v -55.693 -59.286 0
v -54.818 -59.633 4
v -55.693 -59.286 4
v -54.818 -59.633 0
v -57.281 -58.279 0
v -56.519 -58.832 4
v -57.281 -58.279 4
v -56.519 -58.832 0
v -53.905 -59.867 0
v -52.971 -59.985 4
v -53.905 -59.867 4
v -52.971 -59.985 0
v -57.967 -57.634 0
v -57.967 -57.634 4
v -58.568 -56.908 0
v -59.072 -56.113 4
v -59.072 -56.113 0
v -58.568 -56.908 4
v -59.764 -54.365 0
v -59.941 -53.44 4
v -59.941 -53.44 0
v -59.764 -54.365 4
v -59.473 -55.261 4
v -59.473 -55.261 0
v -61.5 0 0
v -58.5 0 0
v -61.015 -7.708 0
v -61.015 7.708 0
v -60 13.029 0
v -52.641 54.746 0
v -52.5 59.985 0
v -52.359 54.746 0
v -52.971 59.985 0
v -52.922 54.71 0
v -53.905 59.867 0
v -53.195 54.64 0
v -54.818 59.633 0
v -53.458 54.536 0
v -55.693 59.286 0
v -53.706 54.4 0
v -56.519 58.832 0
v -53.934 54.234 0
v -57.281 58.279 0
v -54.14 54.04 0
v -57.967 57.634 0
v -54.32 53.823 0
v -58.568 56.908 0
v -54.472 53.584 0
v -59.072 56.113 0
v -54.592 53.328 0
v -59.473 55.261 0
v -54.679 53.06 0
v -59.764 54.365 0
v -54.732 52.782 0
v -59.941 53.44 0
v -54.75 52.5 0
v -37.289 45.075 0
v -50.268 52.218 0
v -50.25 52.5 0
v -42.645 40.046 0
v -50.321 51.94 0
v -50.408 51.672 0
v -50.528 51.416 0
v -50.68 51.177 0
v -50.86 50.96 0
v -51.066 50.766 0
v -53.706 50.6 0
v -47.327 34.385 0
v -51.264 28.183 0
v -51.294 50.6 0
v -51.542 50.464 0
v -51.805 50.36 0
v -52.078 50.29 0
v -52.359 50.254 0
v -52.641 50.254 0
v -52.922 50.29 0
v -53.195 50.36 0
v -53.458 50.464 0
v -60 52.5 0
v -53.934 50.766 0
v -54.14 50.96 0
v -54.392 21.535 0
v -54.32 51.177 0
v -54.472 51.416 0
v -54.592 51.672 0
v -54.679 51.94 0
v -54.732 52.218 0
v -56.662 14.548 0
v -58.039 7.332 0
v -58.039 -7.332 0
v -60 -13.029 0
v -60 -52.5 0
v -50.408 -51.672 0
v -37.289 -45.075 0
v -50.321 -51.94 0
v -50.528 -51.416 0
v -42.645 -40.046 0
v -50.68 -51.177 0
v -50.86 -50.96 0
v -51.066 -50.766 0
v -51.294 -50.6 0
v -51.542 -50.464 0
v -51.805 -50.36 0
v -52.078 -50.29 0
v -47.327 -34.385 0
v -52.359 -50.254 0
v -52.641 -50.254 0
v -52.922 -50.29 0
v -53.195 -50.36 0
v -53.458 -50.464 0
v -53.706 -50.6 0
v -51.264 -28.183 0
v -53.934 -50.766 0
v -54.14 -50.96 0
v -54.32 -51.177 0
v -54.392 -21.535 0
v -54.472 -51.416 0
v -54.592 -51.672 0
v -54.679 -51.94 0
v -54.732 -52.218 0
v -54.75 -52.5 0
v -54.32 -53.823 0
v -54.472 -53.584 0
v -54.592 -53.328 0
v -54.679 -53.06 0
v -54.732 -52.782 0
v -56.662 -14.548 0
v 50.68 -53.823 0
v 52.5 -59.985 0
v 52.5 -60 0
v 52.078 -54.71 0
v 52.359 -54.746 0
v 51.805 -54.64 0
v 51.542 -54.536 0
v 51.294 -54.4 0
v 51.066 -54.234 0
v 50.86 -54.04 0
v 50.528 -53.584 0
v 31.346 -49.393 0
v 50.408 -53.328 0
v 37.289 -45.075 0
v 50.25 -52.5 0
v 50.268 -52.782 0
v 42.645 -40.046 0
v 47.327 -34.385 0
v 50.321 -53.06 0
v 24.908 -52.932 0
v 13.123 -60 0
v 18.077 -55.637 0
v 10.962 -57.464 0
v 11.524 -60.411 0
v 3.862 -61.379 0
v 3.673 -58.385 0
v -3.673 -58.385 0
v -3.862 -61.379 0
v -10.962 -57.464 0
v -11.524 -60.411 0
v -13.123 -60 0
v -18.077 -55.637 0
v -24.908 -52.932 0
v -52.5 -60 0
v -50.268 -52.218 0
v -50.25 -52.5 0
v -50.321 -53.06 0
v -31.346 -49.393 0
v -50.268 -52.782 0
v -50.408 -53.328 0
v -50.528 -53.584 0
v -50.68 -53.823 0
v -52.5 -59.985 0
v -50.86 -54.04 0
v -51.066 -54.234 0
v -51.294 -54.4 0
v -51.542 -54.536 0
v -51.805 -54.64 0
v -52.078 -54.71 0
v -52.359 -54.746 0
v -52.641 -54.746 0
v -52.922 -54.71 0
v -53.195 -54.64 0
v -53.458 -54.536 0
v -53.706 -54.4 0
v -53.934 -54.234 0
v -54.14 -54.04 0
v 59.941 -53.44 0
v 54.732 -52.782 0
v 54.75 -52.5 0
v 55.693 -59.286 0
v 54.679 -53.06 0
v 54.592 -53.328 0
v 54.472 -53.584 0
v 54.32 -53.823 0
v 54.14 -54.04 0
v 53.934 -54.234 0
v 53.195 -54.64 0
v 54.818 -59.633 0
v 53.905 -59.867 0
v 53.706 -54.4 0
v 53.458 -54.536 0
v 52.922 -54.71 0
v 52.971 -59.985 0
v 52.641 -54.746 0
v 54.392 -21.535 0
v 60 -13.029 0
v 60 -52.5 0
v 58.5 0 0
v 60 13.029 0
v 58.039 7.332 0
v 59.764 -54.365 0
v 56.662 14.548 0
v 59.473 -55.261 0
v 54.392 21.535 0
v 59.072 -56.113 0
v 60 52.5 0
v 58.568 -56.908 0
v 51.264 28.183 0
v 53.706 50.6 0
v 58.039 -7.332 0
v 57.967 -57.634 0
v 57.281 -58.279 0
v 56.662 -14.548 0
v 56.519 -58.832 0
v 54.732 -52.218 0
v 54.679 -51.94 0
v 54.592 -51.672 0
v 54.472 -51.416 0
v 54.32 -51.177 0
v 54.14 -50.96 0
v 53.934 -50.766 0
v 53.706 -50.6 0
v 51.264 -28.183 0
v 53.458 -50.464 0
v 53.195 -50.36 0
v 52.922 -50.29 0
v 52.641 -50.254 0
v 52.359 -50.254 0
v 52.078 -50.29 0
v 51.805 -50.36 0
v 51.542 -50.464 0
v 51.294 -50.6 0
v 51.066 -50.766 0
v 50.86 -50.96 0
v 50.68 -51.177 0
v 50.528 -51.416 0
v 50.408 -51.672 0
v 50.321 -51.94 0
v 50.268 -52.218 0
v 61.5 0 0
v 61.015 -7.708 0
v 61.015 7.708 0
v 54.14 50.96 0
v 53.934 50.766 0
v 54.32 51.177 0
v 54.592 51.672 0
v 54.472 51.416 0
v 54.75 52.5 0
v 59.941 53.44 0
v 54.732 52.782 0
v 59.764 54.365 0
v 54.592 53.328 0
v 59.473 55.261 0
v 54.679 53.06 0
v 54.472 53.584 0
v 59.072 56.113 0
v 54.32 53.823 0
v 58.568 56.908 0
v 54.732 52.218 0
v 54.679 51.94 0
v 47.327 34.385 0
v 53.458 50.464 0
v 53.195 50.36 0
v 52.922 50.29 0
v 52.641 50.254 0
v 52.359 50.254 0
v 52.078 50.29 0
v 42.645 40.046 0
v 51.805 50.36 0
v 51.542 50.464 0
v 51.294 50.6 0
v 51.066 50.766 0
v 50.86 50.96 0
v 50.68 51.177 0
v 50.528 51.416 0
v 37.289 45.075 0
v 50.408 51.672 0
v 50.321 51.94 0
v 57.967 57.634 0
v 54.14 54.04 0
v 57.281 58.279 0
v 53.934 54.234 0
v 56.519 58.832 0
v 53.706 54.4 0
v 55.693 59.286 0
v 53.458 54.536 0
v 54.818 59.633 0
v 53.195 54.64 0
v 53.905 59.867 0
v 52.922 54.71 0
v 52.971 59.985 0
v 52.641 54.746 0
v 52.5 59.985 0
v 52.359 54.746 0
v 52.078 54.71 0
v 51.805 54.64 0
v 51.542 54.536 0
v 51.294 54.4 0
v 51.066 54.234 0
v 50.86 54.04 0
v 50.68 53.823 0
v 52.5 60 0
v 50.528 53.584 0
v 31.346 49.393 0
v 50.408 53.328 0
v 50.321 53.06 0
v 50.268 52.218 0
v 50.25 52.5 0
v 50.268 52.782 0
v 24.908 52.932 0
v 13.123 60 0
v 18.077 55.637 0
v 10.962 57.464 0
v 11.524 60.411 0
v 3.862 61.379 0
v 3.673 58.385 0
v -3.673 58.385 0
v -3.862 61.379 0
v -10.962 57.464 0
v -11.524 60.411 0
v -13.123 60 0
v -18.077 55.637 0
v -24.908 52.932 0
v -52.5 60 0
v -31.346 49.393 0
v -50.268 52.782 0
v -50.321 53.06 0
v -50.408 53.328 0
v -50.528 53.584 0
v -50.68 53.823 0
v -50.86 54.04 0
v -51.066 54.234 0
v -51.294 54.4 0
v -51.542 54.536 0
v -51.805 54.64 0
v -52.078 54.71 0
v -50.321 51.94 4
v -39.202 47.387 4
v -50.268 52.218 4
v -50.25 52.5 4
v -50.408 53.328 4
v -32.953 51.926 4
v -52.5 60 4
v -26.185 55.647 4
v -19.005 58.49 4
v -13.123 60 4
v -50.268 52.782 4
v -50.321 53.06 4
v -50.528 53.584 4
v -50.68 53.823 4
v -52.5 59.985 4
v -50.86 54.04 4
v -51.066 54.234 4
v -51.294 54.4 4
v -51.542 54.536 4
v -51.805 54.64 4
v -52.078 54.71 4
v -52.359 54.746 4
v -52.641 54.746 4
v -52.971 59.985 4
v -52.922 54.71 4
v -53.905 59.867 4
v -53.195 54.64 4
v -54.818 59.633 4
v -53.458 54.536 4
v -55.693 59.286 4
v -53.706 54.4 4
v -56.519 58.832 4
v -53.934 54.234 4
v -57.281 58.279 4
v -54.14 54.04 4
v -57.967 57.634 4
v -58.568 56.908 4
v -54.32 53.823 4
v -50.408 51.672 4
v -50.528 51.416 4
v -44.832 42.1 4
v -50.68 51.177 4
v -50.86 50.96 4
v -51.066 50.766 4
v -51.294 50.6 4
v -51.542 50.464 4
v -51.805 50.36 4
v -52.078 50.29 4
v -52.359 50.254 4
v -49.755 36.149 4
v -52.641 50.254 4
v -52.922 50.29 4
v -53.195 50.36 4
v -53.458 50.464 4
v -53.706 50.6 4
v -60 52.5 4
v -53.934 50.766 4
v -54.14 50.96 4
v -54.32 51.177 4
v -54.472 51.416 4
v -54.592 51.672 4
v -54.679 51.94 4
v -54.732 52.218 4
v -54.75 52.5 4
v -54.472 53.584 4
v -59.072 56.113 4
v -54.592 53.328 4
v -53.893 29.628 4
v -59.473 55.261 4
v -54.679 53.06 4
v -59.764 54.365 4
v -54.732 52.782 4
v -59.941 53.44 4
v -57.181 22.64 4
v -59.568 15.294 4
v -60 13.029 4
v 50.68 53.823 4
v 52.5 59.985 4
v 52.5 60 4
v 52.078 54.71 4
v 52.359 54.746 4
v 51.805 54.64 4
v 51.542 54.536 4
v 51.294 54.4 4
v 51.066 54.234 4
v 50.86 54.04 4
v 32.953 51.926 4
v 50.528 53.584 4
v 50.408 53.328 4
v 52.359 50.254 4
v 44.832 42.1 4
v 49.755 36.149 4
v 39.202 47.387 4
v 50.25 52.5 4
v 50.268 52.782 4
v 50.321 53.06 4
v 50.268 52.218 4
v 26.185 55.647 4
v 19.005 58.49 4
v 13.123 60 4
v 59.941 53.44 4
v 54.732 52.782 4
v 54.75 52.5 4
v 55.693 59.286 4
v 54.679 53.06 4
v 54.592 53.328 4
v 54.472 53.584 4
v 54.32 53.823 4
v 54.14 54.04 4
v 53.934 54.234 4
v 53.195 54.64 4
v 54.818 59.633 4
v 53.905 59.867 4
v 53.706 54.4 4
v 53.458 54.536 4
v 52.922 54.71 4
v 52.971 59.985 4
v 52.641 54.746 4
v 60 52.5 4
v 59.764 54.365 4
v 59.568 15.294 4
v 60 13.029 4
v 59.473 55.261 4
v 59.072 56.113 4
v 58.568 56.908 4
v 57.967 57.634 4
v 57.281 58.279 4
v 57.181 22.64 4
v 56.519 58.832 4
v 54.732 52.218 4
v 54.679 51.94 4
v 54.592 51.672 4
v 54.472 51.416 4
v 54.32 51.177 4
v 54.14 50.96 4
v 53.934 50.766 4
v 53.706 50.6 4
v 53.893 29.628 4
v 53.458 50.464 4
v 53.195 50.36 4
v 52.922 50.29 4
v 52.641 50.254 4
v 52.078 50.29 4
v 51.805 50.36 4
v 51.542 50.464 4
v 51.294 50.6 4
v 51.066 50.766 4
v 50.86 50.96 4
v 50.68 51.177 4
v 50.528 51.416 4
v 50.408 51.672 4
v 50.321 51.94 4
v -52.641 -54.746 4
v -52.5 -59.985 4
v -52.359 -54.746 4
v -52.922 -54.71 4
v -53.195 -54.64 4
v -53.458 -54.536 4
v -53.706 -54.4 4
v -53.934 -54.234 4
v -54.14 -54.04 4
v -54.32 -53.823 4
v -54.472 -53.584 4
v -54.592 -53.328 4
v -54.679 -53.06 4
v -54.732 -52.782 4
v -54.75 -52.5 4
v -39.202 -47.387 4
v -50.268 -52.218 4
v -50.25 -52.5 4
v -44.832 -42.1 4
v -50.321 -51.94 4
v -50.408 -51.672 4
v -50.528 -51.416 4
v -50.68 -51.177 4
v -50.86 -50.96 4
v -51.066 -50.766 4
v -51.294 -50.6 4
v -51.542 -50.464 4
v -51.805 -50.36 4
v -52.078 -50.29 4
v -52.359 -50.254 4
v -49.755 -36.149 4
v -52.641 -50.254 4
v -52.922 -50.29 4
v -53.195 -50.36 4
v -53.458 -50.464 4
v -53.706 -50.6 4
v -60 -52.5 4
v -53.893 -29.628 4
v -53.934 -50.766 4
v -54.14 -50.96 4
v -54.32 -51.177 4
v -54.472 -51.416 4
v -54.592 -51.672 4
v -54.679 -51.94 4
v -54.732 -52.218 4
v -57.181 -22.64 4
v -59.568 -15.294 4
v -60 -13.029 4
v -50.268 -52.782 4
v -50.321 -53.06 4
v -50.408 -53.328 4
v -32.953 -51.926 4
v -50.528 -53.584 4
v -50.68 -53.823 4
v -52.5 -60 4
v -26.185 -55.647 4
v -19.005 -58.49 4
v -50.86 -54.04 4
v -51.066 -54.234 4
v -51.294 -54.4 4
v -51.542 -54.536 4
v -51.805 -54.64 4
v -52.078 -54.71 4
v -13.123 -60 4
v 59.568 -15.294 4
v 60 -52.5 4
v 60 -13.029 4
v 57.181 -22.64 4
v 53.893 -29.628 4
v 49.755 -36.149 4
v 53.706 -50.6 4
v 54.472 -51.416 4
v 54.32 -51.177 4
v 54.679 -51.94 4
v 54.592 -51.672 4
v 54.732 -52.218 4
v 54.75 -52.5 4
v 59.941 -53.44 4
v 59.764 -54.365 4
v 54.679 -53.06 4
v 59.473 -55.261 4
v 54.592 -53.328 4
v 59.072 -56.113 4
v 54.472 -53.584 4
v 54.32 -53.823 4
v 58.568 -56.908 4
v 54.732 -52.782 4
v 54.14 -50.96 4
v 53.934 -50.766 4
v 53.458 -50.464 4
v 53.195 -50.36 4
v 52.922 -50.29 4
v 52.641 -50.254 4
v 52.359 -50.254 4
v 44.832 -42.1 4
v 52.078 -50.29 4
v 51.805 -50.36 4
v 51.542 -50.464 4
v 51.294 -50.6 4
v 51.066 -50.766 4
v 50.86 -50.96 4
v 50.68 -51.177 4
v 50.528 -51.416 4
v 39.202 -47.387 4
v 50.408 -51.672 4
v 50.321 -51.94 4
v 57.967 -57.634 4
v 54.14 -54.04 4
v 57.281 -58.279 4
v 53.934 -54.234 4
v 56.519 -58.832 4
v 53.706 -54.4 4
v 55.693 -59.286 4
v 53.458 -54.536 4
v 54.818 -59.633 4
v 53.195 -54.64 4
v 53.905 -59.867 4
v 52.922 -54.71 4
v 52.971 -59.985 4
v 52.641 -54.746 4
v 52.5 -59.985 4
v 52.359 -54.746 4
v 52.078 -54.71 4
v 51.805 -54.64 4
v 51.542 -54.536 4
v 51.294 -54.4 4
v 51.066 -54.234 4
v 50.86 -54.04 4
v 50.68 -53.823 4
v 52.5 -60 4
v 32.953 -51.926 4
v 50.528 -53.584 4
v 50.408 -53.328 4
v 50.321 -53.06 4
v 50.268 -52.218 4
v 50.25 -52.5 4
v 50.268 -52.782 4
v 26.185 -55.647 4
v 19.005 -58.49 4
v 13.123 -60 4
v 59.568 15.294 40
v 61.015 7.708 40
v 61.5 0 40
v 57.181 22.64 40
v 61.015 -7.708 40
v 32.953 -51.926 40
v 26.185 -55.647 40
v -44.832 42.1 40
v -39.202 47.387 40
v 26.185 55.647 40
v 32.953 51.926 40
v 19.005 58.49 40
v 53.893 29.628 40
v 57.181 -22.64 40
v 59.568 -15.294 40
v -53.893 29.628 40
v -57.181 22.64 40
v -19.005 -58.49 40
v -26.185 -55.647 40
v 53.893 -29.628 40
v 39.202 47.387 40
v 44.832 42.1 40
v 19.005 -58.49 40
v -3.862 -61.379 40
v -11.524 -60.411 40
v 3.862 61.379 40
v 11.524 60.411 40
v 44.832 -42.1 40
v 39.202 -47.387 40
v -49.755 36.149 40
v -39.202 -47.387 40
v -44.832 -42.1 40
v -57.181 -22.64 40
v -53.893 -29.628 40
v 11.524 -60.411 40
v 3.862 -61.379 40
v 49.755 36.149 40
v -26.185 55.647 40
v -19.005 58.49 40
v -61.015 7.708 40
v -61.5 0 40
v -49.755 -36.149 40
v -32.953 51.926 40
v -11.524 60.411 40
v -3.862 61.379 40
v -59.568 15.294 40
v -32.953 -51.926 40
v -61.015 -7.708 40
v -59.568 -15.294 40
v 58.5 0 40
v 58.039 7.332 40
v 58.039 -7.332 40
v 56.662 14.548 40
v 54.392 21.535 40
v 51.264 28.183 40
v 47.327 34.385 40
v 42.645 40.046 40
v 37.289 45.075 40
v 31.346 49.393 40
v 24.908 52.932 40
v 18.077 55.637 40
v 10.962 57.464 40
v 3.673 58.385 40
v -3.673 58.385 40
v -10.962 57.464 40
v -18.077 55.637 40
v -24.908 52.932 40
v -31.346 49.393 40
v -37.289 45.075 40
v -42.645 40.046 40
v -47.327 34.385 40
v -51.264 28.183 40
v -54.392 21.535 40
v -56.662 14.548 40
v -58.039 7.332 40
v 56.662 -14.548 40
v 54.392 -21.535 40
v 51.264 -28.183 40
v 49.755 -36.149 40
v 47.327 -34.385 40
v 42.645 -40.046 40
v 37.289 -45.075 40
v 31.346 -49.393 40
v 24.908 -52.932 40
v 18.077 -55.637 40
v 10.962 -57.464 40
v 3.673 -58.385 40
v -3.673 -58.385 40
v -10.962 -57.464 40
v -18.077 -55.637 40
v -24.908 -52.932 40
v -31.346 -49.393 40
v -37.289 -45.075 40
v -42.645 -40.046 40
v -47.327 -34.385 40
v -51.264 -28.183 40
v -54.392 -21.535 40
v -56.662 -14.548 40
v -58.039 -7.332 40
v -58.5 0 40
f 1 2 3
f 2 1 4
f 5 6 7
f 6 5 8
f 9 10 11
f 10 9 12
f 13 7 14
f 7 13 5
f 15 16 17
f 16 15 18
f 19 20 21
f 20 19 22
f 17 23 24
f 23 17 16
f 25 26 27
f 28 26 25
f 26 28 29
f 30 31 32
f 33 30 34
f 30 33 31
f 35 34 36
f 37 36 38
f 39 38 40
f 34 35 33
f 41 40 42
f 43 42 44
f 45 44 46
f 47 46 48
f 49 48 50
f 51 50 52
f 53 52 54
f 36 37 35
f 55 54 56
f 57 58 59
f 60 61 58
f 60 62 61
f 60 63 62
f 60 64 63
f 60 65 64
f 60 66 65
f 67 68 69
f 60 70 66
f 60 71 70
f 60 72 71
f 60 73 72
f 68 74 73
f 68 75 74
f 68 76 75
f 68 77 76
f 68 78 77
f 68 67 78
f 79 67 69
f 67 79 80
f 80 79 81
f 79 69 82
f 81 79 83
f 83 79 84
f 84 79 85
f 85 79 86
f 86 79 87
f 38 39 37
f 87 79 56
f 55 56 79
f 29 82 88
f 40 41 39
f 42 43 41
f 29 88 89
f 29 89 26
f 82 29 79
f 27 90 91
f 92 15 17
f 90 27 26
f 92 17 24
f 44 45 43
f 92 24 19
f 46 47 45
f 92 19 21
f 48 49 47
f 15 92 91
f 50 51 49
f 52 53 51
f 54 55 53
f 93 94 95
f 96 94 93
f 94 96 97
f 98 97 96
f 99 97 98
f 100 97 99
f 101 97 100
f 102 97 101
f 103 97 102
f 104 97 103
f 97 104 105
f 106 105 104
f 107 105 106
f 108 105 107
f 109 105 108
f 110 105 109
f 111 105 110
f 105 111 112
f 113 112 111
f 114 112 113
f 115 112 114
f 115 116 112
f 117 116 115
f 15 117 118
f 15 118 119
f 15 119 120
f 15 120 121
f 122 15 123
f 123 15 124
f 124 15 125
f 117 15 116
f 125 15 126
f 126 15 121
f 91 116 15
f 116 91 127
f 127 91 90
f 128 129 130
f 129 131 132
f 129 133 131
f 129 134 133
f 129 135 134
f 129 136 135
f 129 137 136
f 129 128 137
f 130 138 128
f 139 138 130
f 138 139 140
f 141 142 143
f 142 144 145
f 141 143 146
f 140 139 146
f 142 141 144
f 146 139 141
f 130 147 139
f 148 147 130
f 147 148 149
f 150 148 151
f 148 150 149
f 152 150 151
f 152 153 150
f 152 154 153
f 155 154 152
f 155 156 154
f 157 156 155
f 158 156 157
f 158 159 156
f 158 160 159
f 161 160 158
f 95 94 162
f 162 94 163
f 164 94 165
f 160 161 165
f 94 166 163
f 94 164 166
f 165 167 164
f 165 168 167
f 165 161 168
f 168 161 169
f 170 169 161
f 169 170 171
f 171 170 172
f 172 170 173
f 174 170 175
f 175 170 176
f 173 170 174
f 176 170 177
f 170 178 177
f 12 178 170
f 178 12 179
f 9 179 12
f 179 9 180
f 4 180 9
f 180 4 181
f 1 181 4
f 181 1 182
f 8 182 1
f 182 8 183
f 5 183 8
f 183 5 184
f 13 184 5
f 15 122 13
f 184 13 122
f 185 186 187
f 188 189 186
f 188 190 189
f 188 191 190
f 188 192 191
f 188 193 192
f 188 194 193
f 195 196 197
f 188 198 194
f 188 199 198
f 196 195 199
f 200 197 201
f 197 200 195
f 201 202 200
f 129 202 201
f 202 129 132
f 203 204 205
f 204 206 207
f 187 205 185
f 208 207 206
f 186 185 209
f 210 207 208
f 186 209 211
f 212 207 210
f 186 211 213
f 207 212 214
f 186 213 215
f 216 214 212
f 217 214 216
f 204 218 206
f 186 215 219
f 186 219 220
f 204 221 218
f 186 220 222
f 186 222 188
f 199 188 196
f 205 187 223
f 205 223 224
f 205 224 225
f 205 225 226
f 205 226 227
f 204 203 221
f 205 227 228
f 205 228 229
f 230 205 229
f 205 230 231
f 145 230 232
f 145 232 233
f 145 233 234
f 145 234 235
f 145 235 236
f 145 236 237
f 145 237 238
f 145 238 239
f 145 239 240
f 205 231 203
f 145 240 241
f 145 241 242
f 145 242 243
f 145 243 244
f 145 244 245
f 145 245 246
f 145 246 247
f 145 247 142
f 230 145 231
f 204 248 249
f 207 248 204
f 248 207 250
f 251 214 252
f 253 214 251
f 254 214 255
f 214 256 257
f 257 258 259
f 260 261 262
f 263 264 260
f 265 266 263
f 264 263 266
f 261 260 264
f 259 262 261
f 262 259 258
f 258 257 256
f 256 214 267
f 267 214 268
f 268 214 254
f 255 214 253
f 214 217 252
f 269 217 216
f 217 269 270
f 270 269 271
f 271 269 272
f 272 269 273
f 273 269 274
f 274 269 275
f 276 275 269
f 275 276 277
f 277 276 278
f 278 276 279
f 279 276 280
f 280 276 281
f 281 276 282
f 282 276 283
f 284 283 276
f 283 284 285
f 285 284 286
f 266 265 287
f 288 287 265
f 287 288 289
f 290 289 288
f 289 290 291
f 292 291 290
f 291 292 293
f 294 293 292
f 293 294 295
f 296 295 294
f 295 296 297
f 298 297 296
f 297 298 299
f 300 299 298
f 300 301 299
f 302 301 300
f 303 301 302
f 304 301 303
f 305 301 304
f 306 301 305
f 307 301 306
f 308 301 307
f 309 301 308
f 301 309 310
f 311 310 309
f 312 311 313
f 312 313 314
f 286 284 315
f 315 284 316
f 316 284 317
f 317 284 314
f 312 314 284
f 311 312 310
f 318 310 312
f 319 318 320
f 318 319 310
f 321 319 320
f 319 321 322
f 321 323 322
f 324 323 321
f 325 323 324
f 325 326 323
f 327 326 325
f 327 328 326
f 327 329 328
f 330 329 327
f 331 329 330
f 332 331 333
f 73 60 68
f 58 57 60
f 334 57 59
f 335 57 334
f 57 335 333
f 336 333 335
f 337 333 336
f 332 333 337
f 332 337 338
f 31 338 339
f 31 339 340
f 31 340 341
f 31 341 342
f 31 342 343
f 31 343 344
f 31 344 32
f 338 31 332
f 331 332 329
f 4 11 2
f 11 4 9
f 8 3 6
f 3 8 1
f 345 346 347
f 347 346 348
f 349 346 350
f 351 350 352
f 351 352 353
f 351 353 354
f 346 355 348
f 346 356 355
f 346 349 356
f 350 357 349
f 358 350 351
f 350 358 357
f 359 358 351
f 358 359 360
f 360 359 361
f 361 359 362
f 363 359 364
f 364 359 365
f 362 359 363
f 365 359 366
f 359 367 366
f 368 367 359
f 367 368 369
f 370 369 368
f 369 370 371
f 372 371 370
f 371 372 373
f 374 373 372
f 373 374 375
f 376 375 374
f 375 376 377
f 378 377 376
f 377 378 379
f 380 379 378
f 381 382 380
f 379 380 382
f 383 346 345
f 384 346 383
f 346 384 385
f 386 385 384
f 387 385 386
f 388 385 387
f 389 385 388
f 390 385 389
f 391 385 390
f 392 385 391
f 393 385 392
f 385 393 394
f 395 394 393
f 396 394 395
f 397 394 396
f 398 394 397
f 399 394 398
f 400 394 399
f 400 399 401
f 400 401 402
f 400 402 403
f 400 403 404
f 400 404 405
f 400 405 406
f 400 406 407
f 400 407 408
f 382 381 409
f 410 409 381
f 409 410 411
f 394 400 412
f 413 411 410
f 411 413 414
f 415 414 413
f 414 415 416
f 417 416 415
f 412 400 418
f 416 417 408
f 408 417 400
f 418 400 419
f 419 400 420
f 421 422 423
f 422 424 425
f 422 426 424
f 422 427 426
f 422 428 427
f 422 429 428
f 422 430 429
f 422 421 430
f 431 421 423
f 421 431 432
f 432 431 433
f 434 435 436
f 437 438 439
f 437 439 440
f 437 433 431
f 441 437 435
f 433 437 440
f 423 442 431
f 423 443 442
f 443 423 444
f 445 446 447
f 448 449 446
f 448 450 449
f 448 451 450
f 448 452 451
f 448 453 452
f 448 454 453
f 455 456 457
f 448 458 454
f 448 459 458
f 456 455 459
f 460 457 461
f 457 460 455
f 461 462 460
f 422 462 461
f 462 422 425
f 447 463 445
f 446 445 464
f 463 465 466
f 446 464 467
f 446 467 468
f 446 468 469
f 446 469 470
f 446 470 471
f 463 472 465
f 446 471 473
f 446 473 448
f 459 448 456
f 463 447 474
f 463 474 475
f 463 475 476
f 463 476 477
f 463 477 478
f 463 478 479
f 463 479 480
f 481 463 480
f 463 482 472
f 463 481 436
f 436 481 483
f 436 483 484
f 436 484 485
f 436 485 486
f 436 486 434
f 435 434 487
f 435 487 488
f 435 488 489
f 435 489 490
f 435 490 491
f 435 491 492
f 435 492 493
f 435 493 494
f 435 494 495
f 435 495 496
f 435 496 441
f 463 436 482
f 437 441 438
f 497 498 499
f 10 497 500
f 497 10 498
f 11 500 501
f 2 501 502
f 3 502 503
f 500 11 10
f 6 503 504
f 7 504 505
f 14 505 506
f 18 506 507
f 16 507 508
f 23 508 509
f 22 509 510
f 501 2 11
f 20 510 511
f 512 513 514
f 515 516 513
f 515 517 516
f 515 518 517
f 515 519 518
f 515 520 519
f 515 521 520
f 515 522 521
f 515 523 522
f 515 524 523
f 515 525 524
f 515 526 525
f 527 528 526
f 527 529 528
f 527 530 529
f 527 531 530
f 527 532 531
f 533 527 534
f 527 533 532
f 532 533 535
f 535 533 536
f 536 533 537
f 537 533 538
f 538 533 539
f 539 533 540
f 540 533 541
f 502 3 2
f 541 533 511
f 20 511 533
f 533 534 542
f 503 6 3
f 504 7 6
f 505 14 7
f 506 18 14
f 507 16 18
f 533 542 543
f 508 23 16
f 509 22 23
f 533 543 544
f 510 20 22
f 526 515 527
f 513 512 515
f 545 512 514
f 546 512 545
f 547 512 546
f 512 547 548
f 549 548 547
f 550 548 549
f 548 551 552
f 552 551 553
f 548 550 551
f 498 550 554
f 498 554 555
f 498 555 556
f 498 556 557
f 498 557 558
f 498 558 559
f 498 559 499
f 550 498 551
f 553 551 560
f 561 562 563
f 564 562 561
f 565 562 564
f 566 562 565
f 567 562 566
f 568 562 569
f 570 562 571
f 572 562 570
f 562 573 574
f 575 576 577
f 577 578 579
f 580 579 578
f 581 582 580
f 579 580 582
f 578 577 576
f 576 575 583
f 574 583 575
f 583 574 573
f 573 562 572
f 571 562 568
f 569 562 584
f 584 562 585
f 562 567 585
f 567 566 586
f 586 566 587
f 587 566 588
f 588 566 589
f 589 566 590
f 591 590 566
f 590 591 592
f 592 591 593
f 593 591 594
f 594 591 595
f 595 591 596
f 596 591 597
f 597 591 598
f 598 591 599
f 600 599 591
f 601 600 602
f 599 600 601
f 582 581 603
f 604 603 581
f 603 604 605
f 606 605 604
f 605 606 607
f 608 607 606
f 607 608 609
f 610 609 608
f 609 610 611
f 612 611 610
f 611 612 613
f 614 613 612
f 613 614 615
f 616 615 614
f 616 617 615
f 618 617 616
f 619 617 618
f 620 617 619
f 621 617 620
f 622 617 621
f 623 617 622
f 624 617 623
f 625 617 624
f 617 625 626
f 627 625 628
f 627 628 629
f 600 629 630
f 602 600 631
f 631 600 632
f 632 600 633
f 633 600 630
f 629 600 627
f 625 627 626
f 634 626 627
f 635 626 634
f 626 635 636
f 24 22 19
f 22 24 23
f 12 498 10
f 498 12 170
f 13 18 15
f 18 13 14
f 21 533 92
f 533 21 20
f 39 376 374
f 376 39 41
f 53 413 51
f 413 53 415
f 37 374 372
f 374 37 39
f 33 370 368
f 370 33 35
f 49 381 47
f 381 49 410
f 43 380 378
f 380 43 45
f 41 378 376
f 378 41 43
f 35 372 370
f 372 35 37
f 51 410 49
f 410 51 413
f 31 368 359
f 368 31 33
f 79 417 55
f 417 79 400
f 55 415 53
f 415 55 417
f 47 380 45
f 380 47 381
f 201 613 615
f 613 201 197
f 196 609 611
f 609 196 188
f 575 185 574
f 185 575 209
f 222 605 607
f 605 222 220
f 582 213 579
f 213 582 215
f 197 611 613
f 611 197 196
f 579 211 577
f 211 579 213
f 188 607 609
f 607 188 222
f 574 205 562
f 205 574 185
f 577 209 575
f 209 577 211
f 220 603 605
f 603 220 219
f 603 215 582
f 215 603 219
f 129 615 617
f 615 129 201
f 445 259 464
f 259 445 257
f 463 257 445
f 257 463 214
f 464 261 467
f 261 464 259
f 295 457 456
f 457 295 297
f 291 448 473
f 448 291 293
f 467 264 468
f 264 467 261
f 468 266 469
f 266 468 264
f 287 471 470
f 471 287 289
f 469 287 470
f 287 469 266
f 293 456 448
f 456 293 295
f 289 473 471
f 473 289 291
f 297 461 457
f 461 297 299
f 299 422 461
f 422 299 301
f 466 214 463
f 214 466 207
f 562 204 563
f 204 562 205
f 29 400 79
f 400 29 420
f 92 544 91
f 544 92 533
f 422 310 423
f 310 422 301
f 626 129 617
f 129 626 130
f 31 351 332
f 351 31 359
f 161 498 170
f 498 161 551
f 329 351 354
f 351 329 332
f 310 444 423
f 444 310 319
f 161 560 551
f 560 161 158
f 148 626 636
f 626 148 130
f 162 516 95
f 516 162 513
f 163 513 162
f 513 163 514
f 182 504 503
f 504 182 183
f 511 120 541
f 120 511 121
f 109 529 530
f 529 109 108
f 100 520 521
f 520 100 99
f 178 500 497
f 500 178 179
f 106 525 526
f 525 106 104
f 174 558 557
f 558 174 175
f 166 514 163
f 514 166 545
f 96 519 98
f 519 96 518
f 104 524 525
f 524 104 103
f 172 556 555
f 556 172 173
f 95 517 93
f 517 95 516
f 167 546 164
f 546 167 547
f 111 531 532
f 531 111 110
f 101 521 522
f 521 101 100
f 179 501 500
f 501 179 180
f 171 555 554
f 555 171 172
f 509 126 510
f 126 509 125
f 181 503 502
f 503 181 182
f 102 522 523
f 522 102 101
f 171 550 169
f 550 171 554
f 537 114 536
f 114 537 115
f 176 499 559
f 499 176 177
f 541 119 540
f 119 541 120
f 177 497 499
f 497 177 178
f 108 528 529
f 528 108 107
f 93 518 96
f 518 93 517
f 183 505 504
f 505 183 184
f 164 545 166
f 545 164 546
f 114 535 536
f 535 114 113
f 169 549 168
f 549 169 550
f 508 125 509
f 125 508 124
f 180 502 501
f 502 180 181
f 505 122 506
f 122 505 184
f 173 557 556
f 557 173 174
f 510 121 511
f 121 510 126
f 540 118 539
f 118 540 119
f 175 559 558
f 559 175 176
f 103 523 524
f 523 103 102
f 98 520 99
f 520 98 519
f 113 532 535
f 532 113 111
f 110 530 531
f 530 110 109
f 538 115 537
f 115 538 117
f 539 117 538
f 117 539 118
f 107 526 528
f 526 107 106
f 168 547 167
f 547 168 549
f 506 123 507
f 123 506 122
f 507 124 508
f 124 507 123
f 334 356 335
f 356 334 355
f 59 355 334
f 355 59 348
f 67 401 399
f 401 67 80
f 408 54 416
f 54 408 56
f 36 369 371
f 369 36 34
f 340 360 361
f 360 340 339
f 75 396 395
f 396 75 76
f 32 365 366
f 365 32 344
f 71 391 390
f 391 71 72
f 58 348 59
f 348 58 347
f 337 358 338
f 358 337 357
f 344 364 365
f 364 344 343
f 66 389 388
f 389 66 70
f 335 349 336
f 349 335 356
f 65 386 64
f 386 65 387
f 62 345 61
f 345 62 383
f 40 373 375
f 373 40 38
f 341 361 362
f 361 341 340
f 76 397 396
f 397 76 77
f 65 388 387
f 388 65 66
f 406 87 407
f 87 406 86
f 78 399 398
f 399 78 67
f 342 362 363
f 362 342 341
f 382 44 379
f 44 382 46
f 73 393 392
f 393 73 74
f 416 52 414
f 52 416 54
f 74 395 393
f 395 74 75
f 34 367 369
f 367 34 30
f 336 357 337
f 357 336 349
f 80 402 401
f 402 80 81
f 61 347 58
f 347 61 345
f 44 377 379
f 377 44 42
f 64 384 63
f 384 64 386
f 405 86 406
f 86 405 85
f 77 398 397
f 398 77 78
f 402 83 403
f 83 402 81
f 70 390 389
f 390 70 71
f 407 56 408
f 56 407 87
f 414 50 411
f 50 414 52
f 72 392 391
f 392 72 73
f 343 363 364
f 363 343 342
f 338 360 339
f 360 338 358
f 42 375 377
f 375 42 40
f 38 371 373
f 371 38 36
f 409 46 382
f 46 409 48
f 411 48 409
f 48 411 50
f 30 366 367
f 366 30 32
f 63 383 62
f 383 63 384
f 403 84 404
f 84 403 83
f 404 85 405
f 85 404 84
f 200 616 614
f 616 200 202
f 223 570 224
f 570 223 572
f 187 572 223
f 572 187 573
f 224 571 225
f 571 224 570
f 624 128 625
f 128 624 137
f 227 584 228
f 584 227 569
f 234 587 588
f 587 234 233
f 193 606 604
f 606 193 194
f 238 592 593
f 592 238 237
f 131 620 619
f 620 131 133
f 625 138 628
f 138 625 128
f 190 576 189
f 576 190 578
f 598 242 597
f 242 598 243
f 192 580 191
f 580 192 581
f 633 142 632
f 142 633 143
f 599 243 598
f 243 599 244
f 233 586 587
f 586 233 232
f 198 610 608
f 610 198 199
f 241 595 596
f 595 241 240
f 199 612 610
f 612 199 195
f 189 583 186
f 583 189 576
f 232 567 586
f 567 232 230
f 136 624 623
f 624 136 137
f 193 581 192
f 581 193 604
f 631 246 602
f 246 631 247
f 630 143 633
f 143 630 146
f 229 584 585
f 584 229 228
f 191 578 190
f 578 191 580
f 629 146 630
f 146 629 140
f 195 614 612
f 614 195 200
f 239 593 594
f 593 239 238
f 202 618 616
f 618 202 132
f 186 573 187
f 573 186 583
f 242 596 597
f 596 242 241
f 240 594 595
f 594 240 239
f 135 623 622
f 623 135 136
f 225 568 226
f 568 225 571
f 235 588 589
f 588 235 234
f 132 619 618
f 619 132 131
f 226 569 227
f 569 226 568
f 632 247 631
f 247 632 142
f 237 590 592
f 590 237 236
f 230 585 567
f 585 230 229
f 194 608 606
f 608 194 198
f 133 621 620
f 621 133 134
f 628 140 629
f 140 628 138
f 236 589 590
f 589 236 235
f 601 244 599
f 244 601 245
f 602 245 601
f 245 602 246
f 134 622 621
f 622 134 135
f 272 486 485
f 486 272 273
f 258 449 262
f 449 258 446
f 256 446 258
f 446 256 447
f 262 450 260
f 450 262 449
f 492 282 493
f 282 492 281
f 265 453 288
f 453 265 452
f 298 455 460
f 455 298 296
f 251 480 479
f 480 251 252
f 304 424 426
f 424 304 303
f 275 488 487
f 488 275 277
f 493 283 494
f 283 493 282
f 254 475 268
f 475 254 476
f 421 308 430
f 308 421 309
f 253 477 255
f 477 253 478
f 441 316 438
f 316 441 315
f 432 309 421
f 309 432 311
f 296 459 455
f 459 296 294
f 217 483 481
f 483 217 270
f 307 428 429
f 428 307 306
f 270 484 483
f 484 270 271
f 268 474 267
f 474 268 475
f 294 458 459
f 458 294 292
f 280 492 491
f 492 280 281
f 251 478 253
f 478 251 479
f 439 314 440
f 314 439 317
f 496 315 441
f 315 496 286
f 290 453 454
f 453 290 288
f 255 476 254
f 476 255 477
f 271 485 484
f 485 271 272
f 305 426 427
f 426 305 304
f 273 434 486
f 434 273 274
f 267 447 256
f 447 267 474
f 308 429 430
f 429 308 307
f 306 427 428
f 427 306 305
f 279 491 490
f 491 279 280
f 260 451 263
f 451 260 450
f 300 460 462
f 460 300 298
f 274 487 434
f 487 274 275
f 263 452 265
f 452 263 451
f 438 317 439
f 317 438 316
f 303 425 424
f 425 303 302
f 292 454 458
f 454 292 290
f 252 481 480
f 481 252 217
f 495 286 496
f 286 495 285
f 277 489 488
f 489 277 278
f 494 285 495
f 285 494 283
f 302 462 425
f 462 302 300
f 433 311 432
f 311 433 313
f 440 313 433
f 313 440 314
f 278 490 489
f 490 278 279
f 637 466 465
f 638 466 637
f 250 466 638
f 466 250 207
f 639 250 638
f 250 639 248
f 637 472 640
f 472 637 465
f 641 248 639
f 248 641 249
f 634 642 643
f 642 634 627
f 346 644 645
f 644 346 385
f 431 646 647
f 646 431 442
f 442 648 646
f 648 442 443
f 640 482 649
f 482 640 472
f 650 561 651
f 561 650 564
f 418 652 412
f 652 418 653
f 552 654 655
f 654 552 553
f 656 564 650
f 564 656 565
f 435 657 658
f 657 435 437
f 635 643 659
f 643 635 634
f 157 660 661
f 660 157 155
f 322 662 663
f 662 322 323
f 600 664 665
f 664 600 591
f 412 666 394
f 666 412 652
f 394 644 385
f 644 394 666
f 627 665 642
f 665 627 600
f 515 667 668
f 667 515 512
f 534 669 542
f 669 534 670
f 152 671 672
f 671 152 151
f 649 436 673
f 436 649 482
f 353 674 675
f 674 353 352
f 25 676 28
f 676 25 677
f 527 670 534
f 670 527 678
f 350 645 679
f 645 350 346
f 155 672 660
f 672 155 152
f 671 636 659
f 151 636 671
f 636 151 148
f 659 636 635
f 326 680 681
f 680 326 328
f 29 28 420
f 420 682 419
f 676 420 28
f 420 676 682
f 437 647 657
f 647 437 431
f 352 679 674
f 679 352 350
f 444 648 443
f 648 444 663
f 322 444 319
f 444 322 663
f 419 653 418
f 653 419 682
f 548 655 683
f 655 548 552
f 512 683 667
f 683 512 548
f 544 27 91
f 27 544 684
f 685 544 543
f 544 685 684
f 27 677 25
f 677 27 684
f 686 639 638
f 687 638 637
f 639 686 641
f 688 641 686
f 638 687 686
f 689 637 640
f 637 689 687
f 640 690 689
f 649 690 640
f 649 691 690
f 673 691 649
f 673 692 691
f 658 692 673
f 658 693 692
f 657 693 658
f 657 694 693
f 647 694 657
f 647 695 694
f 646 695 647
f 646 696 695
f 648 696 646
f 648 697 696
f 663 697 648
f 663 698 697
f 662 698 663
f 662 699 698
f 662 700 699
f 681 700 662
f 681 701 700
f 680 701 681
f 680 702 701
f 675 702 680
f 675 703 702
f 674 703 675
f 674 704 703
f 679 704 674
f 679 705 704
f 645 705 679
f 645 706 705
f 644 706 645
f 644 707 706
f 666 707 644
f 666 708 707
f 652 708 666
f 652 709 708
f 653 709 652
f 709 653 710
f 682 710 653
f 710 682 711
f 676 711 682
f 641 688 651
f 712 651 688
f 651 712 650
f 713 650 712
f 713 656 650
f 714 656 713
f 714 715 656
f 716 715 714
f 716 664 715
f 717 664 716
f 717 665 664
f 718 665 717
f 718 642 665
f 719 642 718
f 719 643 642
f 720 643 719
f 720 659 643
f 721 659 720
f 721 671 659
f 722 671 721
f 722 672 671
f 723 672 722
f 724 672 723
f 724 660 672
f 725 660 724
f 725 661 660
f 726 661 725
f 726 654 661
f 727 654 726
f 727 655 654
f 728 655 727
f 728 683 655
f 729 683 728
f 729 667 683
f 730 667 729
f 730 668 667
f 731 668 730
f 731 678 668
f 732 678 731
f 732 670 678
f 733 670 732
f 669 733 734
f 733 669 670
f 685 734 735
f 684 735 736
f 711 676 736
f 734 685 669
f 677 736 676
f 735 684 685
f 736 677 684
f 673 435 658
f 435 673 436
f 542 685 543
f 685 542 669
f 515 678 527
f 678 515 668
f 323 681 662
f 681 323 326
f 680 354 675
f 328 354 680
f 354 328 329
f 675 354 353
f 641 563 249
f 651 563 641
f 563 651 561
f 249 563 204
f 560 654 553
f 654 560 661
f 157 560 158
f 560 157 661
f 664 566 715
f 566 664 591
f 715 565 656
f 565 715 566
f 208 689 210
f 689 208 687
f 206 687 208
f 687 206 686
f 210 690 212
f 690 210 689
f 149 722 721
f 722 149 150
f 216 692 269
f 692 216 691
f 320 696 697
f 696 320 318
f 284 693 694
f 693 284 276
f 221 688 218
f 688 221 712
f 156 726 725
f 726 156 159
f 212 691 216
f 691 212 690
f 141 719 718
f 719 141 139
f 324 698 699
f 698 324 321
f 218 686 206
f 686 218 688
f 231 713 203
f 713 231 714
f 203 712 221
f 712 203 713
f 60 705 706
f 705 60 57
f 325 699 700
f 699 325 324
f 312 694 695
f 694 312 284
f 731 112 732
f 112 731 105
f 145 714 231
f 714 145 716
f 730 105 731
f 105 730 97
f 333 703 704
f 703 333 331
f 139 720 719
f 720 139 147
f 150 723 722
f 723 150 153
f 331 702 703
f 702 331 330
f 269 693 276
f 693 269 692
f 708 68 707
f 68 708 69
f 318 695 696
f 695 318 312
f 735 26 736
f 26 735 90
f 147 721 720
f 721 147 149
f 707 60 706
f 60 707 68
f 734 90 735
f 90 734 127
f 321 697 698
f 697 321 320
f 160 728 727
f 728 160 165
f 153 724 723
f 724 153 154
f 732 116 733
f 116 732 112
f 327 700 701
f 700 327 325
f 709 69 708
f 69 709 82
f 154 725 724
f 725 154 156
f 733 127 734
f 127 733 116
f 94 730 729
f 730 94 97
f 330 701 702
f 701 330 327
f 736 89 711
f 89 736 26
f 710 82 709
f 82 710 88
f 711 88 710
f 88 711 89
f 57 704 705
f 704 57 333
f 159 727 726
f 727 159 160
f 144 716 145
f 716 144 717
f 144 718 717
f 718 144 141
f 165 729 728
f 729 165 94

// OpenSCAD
$fn = 50;

module flansch(breite_flansch, abstand_bohrungen, durchmesser_bohrung, hoehe){
    radius_abrundung=(breite_flansch-abstand_bohrungen)/2;
    difference(){
        union(){
            translate([-breite_flansch/2, -breite_flansch/2+radius_abrundung, 0]){
                cube([breite_flansch_unten, breite_flansch_unten-2*radius_abrundung, hoehe]);
                }
            translate([-breite_flansch/2+radius_abrundung, -breite_flansch/2, 0]){
                cube([breite_flansch-2*radius_abrundung, breite_flansch, hoehe]);
                }
            for(x = [-1, 1]){
                for (y = [-1, 1]){
                    translate([x * (breite_flansch/2-radius_abrundung), y * (breite_flansch/2-radius_abrundung), 0]){
                        cylinder(hoehe, radius_abrundung, radius_abrundung);
                        }
                    }
                }
            }
        for(x = [-1, 1]){
            for (y = [-1, 1]){
                translate([x * (breite_flansch/2-radius_abrundung), y * (breite_flansch/2-radius_abrundung), 0]){
                    cylinder(hoehe, durchmesser_bohrung/2, durchmesser_bohrung/2);
                    }
                }
            }
        }
    }


hoehe_flansch=4;
breite_flansch_unten = 120;
abstand_bohrungen_unten = 105;
bohrung = 4.5;
laenge_cylinder = 40;
staerke_wandung= 3;
durchmesser_ventilator = 117;

difference(){
    union(){
        flansch(breite_flansch_unten, abstand_bohrungen_unten, bohrung, hoehe_flansch);
        cylinder(laenge_cylinder, durchmesser_ventilator/2+staerke_wandung, durchmesser_ventilator/2+staerke_wandung);
        }
    union(){
        cylinder(laenge_cylinder, durchmesser_ventilator/2, durchmesser_ventilator/2);
        }    
    }
